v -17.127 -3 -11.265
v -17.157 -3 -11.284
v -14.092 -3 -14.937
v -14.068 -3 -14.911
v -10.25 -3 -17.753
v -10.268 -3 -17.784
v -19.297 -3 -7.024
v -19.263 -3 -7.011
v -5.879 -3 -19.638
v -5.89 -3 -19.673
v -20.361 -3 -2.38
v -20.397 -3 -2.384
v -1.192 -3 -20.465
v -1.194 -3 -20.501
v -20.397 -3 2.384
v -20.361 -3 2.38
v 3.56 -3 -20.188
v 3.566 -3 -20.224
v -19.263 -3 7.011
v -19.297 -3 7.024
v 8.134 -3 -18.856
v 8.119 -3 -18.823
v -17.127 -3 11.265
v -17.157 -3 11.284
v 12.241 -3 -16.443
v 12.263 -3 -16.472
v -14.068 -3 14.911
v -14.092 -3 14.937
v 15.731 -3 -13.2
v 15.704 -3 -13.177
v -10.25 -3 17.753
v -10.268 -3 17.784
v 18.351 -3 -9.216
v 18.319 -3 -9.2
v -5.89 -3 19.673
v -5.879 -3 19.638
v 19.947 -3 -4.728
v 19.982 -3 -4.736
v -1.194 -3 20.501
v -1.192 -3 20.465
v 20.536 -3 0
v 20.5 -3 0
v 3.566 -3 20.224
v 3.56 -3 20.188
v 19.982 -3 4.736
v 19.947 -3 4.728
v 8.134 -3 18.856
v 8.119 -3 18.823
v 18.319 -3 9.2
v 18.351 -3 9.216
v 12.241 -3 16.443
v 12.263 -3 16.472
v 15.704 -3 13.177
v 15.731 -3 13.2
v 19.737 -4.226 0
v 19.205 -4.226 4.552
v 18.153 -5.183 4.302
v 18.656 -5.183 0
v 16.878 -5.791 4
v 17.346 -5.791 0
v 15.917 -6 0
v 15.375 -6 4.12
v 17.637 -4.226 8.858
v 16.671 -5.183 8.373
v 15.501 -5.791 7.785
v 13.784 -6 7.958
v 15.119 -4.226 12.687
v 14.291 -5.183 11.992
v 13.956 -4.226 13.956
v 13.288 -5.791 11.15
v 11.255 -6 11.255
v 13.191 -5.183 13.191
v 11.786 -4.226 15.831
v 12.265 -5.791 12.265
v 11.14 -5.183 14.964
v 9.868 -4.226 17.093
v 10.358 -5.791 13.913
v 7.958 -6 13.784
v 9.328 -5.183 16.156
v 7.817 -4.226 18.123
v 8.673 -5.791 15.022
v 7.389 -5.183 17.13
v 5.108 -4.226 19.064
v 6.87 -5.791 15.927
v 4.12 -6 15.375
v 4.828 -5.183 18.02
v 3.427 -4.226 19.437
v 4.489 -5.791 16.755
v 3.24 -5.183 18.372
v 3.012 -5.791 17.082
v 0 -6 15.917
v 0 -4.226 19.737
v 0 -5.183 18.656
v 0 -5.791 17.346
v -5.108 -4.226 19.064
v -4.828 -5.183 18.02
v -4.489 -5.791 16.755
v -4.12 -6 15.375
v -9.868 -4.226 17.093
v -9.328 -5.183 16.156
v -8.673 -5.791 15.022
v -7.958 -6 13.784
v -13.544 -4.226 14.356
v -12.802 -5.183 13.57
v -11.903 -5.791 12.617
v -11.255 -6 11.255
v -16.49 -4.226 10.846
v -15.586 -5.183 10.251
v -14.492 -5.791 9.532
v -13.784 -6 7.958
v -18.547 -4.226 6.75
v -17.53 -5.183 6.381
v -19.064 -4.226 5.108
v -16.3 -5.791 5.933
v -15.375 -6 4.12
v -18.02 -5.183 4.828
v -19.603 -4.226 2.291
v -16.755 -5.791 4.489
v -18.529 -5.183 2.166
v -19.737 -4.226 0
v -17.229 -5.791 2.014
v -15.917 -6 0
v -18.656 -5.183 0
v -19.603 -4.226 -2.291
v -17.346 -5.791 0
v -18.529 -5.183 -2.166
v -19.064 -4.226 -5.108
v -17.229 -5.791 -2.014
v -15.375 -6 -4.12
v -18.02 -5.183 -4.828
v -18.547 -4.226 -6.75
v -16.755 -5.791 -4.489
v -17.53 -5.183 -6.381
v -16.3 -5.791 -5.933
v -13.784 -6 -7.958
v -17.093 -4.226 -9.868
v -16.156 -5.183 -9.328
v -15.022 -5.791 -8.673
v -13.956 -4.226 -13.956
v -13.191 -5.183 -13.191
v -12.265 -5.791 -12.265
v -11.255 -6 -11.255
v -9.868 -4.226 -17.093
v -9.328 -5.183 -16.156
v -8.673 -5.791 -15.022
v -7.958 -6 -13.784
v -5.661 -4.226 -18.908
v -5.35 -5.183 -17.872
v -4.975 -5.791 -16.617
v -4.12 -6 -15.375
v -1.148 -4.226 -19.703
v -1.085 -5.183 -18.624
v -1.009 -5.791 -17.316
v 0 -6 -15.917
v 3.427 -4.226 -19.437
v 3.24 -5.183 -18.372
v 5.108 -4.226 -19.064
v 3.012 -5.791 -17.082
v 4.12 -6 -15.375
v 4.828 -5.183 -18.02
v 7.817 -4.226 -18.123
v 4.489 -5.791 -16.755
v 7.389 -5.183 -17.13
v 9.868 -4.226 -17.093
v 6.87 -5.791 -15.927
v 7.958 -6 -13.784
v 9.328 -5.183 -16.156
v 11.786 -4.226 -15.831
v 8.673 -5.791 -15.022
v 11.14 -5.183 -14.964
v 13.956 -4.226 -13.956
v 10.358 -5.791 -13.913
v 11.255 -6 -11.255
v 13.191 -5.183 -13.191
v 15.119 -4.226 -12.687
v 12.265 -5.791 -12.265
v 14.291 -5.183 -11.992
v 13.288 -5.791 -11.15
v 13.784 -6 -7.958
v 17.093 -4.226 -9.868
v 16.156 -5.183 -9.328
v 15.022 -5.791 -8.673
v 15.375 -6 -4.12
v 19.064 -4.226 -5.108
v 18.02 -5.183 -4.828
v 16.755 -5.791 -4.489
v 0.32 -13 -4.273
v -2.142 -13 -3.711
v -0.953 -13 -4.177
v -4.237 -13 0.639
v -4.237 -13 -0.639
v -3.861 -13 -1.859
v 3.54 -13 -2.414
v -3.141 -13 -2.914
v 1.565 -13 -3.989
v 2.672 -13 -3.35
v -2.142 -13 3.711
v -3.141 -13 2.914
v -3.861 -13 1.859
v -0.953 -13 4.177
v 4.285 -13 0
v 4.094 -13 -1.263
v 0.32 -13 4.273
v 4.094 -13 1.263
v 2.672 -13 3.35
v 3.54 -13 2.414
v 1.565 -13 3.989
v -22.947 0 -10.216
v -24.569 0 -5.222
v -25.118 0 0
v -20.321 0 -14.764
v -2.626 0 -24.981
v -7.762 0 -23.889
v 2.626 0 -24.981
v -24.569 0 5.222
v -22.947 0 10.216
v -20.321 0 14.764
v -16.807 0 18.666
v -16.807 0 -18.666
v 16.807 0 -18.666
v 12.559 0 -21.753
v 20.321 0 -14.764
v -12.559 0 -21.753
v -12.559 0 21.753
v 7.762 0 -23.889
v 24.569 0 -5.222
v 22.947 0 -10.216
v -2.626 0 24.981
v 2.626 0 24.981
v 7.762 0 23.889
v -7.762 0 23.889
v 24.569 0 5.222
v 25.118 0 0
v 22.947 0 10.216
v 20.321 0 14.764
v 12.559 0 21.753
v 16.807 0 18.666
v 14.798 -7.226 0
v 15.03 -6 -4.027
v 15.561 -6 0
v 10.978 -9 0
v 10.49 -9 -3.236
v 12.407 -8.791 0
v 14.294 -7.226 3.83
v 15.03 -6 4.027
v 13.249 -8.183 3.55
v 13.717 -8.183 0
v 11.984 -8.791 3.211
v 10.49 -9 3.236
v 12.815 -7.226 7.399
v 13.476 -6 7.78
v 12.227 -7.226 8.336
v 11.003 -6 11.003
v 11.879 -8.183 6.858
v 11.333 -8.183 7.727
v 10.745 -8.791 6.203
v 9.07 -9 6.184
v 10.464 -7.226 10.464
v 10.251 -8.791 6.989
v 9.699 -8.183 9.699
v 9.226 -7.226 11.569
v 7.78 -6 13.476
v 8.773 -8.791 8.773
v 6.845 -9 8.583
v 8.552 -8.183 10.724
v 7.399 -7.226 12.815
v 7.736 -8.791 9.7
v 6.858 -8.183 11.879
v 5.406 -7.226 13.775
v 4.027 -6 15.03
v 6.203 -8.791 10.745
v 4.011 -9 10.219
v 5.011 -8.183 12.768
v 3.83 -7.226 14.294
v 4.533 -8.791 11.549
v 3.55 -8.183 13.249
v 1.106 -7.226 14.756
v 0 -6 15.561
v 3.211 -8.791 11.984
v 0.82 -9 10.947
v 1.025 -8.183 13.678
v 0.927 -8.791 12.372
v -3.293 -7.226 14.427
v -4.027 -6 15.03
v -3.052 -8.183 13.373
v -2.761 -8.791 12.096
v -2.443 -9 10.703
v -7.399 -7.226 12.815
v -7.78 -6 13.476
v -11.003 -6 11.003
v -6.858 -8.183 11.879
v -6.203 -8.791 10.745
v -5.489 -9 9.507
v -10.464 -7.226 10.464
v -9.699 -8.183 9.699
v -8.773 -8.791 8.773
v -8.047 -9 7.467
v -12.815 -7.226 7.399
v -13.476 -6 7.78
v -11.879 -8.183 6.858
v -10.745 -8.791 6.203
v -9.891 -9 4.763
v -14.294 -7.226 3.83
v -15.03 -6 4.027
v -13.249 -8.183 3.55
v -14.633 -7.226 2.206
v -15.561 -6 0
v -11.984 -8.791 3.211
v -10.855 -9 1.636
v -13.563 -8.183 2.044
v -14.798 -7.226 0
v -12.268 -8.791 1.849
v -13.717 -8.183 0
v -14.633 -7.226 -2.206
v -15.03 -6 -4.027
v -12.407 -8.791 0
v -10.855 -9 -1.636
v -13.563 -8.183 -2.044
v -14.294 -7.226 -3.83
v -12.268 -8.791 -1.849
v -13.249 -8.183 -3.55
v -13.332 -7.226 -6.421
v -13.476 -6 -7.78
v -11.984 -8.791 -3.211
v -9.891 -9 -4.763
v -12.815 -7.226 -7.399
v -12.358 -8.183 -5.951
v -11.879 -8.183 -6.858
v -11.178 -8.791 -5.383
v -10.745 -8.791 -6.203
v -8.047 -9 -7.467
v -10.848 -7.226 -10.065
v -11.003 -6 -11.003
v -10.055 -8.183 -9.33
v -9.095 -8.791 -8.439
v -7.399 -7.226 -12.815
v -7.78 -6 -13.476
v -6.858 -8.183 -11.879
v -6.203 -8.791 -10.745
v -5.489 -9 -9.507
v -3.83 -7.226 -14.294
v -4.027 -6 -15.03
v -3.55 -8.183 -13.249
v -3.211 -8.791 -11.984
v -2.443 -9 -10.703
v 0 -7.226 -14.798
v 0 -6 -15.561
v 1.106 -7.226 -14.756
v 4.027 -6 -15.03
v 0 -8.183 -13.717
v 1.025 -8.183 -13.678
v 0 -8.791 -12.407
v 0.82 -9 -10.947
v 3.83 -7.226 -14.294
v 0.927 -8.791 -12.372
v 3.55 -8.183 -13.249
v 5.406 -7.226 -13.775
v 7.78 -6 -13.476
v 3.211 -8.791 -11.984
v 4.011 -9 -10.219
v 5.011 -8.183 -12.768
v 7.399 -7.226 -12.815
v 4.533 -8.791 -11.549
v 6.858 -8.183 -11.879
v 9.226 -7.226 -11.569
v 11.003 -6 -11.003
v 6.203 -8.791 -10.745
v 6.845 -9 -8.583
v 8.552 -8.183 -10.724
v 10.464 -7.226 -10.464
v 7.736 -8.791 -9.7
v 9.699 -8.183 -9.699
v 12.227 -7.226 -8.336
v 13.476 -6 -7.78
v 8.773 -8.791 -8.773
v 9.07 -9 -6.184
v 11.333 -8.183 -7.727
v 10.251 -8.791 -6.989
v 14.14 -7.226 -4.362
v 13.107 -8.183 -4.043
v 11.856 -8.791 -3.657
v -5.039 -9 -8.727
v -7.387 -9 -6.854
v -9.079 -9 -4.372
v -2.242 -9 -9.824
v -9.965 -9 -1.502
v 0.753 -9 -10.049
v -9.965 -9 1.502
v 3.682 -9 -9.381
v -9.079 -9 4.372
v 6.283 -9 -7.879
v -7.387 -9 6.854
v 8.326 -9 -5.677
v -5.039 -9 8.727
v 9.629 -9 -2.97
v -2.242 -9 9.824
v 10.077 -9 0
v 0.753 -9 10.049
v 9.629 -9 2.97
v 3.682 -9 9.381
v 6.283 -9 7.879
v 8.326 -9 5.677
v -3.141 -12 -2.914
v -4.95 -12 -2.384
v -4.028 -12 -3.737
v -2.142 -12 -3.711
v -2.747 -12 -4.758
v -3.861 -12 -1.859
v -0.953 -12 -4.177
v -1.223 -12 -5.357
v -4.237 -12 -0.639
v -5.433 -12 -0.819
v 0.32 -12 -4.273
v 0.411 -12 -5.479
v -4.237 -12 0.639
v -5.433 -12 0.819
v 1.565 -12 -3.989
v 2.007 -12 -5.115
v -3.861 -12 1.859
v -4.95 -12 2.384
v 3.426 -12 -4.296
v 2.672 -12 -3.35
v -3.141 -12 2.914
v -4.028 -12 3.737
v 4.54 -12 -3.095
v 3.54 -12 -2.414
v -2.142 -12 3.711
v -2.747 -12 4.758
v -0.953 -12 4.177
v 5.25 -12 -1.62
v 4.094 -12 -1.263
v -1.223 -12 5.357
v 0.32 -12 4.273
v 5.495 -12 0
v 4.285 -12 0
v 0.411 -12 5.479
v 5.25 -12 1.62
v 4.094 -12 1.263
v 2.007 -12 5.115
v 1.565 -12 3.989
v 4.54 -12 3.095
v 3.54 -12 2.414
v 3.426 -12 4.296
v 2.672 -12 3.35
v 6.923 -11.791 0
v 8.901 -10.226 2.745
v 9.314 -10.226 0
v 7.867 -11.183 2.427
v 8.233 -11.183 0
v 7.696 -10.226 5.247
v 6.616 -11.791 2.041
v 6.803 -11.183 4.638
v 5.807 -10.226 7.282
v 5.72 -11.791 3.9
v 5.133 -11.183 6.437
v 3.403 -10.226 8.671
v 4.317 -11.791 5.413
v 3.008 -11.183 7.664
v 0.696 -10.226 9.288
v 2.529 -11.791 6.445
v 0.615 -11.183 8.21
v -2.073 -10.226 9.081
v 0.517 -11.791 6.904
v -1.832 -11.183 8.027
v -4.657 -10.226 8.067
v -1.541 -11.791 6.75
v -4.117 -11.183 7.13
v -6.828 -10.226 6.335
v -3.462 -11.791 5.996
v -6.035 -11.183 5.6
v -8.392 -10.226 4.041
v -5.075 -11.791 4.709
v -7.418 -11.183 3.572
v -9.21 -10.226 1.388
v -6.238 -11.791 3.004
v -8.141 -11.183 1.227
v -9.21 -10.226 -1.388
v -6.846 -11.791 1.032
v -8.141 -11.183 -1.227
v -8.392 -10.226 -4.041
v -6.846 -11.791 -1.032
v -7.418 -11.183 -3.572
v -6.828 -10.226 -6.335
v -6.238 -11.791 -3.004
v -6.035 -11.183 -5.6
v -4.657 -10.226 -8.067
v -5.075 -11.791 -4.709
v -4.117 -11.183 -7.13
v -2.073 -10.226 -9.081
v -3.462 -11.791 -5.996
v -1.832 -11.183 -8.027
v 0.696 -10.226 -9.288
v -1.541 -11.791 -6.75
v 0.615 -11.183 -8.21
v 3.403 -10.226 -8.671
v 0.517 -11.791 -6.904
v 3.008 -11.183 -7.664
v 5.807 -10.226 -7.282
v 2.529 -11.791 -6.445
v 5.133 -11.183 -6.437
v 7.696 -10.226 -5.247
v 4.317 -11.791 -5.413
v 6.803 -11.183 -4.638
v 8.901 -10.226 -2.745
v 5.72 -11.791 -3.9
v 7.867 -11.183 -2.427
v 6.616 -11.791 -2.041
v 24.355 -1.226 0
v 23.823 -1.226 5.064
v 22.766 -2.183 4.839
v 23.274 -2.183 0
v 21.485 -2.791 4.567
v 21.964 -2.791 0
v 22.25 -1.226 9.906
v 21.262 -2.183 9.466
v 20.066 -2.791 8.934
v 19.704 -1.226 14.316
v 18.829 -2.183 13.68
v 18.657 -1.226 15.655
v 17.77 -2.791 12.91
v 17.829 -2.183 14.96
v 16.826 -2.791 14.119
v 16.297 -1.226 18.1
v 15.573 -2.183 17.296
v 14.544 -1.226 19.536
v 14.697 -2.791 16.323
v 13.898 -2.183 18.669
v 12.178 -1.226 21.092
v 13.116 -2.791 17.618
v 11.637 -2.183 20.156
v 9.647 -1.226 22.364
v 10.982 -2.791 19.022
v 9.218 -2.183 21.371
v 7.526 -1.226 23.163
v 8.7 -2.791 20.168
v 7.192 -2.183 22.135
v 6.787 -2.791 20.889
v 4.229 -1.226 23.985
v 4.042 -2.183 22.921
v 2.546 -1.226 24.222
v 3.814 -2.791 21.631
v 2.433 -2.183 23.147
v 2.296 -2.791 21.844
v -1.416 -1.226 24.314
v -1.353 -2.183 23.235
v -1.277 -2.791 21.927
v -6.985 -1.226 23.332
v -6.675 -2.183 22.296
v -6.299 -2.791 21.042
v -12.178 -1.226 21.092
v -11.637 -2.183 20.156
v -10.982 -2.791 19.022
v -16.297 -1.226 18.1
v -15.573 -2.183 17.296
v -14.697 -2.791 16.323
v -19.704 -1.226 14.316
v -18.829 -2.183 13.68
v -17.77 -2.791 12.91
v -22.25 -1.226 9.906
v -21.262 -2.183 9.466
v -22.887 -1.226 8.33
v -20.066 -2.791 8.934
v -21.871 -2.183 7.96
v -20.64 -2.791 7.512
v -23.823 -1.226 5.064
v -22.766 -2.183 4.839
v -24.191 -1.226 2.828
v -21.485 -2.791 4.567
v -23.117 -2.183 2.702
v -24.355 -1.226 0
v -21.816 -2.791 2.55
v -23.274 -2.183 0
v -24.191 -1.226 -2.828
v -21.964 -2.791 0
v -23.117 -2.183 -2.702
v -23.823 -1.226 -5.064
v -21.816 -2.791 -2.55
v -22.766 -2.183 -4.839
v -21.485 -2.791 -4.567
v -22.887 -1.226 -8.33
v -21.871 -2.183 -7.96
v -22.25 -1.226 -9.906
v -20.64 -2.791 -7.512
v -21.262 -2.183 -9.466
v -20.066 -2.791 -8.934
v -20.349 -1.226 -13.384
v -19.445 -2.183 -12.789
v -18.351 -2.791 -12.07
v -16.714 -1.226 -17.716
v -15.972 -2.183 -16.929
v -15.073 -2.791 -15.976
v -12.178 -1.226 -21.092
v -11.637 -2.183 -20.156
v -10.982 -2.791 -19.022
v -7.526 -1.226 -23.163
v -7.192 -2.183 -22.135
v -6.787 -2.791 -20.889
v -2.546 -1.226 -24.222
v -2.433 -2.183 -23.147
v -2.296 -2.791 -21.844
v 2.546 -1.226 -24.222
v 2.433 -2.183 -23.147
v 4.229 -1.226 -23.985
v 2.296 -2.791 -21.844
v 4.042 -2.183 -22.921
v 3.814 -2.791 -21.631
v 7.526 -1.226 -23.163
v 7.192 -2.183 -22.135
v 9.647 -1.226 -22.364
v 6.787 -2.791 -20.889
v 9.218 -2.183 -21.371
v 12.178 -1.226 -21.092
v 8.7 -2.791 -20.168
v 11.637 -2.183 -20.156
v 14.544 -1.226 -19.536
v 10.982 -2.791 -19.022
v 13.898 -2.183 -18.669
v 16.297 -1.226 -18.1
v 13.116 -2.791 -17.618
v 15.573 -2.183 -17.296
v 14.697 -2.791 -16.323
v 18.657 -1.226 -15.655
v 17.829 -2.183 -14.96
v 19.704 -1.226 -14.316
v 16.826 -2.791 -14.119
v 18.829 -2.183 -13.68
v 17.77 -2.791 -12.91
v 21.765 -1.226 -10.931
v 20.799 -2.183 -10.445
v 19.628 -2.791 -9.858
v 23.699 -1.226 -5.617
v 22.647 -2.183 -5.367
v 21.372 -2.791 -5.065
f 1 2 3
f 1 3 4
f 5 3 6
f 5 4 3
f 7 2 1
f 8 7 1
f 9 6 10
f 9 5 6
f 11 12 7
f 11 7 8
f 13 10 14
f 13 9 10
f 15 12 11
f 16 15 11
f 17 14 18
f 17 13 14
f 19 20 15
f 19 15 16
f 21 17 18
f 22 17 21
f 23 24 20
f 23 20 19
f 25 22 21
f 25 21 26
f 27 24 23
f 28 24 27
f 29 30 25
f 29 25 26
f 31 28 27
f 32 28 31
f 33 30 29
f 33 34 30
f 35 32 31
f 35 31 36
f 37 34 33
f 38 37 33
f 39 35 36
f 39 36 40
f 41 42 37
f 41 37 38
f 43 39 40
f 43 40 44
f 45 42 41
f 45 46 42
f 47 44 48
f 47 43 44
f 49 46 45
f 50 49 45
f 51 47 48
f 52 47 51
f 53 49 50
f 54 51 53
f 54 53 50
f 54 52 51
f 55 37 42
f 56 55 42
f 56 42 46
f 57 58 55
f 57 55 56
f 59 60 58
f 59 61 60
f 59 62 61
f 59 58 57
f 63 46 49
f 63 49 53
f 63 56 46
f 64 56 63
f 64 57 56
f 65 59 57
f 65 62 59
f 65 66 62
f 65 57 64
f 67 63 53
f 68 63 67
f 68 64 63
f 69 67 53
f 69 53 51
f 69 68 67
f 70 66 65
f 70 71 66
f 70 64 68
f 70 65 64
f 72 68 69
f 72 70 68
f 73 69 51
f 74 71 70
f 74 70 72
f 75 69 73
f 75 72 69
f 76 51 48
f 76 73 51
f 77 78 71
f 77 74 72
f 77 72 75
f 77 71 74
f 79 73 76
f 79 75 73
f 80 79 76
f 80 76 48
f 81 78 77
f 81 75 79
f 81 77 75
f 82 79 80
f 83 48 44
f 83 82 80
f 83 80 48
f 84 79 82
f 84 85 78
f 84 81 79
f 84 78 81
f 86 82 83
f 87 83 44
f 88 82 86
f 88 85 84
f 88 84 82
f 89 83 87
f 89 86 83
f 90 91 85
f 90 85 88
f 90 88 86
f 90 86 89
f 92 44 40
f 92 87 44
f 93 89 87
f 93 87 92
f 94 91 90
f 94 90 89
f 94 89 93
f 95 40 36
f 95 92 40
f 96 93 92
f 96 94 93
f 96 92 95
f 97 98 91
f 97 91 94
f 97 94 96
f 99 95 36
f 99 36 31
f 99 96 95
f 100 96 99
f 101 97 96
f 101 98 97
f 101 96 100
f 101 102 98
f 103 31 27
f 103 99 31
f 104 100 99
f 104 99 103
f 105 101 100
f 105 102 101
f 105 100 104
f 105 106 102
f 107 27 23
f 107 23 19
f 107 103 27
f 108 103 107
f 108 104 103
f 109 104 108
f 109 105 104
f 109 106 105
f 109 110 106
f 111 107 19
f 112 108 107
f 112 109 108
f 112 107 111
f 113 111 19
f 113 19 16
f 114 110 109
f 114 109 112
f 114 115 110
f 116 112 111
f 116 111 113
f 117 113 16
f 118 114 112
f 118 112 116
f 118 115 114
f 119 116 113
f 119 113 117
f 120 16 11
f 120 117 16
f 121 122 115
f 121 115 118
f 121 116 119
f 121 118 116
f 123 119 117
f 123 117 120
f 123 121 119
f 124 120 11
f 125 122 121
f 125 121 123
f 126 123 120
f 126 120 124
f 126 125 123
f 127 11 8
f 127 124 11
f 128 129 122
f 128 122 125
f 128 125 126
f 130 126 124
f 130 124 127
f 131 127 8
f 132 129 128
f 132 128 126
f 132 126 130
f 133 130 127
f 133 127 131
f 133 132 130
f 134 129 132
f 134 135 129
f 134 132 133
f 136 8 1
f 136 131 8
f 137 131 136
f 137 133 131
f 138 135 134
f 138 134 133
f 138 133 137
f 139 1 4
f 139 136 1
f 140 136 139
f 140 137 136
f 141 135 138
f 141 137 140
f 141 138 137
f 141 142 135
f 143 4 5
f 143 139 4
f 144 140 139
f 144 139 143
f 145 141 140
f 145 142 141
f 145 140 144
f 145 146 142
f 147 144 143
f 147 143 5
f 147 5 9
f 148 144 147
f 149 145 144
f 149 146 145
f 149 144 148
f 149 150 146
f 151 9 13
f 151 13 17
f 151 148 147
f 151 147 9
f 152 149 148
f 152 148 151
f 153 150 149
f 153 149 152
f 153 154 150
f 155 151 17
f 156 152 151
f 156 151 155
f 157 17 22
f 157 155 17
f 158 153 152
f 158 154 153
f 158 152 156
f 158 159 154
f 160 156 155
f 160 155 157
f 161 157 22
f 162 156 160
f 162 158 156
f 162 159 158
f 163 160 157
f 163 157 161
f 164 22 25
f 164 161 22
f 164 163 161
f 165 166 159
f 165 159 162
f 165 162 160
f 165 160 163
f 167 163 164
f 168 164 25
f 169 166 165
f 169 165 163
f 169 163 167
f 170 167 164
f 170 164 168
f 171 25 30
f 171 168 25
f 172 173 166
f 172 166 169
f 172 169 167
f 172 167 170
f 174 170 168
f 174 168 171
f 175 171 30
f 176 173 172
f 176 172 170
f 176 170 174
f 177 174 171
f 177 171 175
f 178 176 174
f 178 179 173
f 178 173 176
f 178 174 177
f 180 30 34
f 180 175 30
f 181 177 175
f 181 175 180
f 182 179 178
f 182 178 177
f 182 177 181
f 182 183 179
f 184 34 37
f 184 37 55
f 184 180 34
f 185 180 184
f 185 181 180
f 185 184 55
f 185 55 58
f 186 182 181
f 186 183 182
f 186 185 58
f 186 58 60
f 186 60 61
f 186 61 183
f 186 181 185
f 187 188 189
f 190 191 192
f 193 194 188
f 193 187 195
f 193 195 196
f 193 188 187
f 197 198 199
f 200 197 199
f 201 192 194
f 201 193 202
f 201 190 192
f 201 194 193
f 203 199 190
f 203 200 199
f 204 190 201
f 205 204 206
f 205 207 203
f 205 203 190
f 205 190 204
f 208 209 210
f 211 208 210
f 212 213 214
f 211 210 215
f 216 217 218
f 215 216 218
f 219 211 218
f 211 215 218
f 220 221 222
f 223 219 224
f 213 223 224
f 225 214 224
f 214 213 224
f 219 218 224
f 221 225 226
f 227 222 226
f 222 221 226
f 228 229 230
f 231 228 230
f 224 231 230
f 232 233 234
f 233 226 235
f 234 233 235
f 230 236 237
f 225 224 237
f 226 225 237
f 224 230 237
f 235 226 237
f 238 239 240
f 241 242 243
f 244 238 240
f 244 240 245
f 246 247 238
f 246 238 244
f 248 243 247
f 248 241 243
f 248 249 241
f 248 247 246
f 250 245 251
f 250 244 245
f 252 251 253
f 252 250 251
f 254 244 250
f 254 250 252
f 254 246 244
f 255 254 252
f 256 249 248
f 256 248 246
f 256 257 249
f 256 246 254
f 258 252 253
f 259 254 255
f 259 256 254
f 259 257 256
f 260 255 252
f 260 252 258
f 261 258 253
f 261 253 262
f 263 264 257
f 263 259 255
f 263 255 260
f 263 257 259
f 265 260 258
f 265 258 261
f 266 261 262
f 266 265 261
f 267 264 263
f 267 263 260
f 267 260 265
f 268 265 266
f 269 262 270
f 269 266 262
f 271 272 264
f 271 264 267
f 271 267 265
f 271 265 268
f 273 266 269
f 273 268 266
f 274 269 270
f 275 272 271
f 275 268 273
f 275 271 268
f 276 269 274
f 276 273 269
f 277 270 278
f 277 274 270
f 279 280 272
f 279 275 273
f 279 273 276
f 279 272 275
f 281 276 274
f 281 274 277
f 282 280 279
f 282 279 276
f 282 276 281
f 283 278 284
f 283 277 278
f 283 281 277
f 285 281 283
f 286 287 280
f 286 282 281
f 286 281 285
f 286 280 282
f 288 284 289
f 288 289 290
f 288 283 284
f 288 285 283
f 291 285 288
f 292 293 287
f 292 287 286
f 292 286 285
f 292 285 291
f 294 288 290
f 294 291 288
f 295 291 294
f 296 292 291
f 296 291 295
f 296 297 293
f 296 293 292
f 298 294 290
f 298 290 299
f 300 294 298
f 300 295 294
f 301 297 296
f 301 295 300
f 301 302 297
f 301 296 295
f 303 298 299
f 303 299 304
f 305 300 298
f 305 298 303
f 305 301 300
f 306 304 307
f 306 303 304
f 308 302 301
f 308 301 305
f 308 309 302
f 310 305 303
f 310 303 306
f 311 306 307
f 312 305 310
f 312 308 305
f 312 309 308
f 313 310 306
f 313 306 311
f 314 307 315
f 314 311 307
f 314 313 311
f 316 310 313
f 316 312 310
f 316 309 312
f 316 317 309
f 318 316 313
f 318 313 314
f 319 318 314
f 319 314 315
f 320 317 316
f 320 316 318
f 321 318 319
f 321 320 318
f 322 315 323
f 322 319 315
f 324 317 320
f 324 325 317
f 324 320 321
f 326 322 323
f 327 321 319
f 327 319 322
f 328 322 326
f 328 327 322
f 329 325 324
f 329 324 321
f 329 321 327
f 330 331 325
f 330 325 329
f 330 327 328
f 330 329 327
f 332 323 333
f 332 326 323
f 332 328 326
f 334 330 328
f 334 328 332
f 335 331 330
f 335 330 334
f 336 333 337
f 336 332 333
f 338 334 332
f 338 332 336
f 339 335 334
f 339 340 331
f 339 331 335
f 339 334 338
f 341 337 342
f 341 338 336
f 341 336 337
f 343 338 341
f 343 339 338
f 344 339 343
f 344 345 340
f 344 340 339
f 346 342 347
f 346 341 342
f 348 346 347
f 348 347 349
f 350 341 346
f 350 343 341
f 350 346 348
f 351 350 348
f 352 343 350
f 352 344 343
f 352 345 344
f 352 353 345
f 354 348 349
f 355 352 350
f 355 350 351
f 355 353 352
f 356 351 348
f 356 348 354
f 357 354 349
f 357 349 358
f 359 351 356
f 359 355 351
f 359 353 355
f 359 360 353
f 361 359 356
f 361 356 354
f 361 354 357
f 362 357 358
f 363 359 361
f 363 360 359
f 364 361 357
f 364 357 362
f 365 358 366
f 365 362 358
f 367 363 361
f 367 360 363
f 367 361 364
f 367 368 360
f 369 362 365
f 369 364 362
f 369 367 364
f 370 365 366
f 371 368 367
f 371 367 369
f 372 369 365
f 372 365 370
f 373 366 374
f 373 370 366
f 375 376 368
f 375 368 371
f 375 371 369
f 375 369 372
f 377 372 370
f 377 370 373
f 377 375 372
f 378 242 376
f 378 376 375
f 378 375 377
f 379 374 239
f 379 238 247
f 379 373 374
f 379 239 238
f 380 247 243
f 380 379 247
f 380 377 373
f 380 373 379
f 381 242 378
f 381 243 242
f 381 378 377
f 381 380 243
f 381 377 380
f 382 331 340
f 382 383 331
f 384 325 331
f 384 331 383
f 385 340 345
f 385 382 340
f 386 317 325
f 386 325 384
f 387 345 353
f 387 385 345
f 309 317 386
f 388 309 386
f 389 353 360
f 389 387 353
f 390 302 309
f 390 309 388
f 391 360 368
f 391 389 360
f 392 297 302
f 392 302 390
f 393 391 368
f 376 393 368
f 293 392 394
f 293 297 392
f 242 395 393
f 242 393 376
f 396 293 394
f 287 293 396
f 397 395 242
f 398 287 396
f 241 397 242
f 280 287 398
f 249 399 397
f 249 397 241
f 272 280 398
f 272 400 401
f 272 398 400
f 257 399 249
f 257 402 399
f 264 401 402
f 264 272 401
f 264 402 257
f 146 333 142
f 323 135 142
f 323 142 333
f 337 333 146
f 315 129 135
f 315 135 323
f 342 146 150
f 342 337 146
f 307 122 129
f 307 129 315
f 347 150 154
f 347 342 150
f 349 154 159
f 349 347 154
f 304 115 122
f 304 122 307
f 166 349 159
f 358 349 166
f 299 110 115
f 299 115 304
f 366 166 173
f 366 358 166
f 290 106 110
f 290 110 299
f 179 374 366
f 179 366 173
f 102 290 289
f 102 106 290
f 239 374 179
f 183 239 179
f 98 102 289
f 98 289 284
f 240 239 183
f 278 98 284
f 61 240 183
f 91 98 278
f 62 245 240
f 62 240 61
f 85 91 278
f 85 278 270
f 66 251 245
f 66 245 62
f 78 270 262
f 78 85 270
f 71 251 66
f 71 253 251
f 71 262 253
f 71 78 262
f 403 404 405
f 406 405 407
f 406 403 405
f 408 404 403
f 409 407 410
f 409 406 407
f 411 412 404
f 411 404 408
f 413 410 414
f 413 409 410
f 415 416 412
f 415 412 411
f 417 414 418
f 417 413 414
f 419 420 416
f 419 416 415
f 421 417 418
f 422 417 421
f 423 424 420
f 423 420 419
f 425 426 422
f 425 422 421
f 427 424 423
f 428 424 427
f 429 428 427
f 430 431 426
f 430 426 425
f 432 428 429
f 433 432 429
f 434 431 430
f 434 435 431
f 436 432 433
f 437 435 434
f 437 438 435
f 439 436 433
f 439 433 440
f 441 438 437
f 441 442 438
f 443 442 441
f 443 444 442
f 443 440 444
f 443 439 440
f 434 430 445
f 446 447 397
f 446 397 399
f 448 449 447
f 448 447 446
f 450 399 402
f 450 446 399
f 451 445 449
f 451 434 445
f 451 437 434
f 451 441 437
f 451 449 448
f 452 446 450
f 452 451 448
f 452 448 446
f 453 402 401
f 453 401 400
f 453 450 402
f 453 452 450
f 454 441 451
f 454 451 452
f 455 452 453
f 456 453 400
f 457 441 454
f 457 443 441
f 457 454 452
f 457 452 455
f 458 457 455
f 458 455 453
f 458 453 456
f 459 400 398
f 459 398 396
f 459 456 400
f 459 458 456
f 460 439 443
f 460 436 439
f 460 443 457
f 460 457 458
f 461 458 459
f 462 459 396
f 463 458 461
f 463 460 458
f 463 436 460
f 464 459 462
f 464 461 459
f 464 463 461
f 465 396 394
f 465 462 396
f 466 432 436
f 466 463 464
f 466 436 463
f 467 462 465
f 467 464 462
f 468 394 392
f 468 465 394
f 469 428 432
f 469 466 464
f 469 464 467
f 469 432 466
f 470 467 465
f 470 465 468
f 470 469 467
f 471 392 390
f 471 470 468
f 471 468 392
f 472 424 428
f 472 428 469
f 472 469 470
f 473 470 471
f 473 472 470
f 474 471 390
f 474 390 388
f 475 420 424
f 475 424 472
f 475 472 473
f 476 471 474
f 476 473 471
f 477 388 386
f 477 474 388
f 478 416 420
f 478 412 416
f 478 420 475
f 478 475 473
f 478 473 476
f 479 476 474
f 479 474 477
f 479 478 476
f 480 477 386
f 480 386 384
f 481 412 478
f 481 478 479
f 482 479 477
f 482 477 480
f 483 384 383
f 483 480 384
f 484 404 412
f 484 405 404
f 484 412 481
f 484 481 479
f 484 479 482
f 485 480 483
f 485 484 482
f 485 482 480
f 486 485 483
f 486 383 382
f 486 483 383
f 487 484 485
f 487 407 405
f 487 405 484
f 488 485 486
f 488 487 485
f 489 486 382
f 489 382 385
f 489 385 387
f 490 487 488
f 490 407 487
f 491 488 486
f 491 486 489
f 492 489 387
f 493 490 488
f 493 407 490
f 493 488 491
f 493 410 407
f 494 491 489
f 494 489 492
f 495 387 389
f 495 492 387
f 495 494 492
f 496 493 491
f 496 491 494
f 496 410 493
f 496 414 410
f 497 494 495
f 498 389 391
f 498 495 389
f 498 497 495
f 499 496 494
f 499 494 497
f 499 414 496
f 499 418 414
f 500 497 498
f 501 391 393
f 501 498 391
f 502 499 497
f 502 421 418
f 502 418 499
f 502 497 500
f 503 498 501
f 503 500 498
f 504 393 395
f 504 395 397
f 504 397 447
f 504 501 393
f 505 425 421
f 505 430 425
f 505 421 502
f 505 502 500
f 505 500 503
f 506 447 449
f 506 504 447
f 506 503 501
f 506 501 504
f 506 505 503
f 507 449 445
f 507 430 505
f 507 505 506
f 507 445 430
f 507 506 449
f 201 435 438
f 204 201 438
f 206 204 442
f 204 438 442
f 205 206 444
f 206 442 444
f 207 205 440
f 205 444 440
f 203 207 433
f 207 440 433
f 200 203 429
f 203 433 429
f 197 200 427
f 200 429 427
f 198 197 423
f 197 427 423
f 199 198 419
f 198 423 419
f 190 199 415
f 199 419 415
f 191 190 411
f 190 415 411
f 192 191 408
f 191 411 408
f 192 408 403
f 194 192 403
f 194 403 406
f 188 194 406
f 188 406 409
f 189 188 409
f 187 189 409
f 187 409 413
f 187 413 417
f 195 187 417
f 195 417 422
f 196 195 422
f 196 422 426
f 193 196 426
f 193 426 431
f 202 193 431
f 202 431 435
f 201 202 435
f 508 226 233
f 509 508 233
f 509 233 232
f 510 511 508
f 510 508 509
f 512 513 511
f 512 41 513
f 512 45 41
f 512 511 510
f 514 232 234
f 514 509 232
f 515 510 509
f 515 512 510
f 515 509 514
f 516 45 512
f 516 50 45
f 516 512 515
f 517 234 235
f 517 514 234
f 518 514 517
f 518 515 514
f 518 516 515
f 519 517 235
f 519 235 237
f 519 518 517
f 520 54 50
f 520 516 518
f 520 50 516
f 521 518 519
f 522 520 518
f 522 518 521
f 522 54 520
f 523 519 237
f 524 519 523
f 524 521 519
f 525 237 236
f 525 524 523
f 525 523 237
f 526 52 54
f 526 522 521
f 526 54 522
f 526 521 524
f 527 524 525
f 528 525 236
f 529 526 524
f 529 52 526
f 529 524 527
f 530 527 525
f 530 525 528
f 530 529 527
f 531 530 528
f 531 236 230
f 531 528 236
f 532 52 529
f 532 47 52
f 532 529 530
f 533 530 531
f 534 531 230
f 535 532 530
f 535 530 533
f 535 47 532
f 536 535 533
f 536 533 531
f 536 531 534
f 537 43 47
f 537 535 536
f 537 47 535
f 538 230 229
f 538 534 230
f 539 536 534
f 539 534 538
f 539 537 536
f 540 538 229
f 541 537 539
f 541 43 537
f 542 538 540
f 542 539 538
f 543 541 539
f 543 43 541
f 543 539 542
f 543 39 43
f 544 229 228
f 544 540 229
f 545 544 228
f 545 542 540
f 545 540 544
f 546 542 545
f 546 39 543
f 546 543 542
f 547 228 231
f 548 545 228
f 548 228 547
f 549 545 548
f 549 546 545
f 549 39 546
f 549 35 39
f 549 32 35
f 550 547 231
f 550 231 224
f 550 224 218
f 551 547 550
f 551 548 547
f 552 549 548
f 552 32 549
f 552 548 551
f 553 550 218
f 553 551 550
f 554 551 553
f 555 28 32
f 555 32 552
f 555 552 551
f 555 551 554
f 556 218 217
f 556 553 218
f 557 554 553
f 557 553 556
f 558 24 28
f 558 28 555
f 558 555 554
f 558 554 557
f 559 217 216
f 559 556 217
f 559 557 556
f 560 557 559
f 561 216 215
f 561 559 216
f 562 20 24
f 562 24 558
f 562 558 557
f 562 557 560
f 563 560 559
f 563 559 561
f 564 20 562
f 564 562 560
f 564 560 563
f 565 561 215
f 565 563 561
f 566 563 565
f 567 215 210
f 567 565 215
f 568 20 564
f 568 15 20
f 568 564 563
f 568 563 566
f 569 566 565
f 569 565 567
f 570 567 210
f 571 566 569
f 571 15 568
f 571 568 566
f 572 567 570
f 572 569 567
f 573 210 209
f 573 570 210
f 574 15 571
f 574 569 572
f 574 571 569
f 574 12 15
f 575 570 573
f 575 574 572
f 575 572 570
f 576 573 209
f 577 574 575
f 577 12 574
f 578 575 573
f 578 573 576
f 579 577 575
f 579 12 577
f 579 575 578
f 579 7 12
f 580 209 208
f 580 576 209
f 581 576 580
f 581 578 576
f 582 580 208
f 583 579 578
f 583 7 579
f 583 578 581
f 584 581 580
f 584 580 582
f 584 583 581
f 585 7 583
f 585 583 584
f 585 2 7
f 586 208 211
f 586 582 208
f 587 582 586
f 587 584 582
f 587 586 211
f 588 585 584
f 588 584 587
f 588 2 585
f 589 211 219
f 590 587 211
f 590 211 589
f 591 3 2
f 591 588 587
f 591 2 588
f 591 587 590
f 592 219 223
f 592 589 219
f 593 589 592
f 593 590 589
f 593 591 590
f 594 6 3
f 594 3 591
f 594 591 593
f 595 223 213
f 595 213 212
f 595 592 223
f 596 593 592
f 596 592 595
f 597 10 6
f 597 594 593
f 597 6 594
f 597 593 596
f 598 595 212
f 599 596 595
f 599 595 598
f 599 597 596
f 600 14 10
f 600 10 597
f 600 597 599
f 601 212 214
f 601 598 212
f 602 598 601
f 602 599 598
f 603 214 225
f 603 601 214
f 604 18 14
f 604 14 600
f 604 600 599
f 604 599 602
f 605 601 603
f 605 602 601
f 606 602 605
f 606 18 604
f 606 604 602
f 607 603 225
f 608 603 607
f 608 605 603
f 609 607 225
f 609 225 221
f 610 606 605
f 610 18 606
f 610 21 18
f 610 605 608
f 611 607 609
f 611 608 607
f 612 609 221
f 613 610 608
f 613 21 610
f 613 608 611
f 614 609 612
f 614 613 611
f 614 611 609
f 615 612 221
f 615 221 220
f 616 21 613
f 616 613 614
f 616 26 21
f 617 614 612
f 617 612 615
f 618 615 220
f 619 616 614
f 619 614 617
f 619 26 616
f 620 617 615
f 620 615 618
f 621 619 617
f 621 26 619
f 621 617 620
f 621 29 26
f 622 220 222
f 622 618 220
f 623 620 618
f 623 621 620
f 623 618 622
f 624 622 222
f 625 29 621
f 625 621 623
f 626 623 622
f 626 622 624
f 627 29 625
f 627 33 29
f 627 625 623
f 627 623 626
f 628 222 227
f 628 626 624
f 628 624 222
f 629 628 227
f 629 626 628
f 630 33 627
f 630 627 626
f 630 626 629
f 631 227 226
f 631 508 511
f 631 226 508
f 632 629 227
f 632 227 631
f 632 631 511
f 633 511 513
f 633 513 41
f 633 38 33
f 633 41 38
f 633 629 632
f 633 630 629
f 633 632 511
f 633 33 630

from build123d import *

# Parameters (mm, degrees)
F0_R     = 25.1181711361
F0_R_2   = 20.4995111856
F1_DEPTH = 3
F0_R_3   = 15.560509686
F2_DEPTH = 6
F0_R_4   = 10.0770984701
F3_DEPTH = 9
F0_R_5   = 4.2848341216
F4_DEPTH = 12
F0_R_6   = 1.2539122761
F5_DEPTH = 13
F6_DEPTH = 13


# Not quite as in the source:
# - a fillet or chamfer that OpenCascade refuses, or shapes differently, is made with other operations: its cross-section is extruded or revolved along the edge and cut away or added


with BuildPart() as f1:
    # F0 (on Front) → F1 (new body)
    with BuildSketch(Plane.XZ):
        Circle(F0_R)
        Circle(F0_R_2, mode=Mode.SUBTRACT)
    extrude(amount=F1_DEPTH)

    # F0 (on Front) → F2 (join)
    with BuildSketch(Plane.XZ):
        Circle(F0_R_2)
        Circle(F0_R_3, mode=Mode.SUBTRACT)
    extrude(amount=F2_DEPTH)

    # F0 (on Front) → F3 (join)
    with BuildSketch(Plane.XZ):
        Circle(F0_R_3)
        Circle(F0_R_4, mode=Mode.SUBTRACT)
    extrude(amount=F3_DEPTH)

    # F0 (on Front) → F4 (join)
    with BuildSketch(Plane.XZ):
        Circle(F0_R_4)
        Circle(F0_R_5, mode=Mode.SUBTRACT)
    extrude(amount=F4_DEPTH)

    # F0 (on Front) → F5 (join)
    with BuildSketch(Plane.XZ):
        Circle(F0_R_5)
        Circle(F0_R_6, mode=Mode.SUBTRACT)
    extrude(amount=F5_DEPTH)

    # F0 (on Front) → F6 (join)
    with BuildSketch(Plane.XZ):
        Circle(F0_R_6)
    extrude(amount=F6_DEPTH)

    # F7: fillet of radius 5 on 4 edges, made by hand

    # F7_s1 → F7_t2 (revolve, cut)
    with BuildSketch(Plane.XY):
        with BuildLine():
            ThreePointArc((25.1181711361, 0), (23.2742082286, -2.1833001327), (20.5355954411, -3))
            Line((20.5355954411, -3), (25.1181711361, -3))
            Line((25.1181711361, -3), (25.1181711361, 0))
        make_face()
    revolve(axis=Axis((0, -3, 0), (0, -1, 0)), mode=Mode.SUBTRACT)

    # F7_s3 → F7_t4 (revolve, cut)
    with BuildSketch(Plane.XY):
        with BuildLine():
            ThreePointArc((20.4995111856, -3), (18.6555482782, -5.1833001327), (15.9169354907, -6))
            Line((15.9169354907, -6), (20.4995111856, -6))
            Line((20.4995111856, -6), (20.4995111856, -3))
        make_face()
    revolve(axis=Axis((0, -6, 0), (0, -1, 0)), mode=Mode.SUBTRACT)

    # F7_s5 → F7_t6 (revolve, cut)
    with BuildSketch(Plane.XY):
        with BuildLine():
            ThreePointArc((15.560509686, -6), (13.7165467785, -8.1833001327), (10.977933991, -9))
            Line((10.977933991, -9), (15.560509686, -9))
            Line((15.560509686, -9), (15.560509686, -6))
        make_face()
    revolve(axis=Axis((0, -9, 0), (0, -1, 0)), mode=Mode.SUBTRACT)

    # F7_s7 → F7_t8 (revolve, cut)
    with BuildSketch(Plane.XY):
        with BuildLine():
            ThreePointArc((10.0770984701, -9), (8.2331355627, -11.1833001327), (5.4945227752, -12))
            Line((5.4945227752, -12), (10.0770984701, -12))
            Line((10.0770984701, -12), (10.0770984701, -9))
        make_face()
    revolve(axis=Axis((0, -12, 0), (0, -1, 0)), mode=Mode.SUBTRACT)


solid = f1.part
